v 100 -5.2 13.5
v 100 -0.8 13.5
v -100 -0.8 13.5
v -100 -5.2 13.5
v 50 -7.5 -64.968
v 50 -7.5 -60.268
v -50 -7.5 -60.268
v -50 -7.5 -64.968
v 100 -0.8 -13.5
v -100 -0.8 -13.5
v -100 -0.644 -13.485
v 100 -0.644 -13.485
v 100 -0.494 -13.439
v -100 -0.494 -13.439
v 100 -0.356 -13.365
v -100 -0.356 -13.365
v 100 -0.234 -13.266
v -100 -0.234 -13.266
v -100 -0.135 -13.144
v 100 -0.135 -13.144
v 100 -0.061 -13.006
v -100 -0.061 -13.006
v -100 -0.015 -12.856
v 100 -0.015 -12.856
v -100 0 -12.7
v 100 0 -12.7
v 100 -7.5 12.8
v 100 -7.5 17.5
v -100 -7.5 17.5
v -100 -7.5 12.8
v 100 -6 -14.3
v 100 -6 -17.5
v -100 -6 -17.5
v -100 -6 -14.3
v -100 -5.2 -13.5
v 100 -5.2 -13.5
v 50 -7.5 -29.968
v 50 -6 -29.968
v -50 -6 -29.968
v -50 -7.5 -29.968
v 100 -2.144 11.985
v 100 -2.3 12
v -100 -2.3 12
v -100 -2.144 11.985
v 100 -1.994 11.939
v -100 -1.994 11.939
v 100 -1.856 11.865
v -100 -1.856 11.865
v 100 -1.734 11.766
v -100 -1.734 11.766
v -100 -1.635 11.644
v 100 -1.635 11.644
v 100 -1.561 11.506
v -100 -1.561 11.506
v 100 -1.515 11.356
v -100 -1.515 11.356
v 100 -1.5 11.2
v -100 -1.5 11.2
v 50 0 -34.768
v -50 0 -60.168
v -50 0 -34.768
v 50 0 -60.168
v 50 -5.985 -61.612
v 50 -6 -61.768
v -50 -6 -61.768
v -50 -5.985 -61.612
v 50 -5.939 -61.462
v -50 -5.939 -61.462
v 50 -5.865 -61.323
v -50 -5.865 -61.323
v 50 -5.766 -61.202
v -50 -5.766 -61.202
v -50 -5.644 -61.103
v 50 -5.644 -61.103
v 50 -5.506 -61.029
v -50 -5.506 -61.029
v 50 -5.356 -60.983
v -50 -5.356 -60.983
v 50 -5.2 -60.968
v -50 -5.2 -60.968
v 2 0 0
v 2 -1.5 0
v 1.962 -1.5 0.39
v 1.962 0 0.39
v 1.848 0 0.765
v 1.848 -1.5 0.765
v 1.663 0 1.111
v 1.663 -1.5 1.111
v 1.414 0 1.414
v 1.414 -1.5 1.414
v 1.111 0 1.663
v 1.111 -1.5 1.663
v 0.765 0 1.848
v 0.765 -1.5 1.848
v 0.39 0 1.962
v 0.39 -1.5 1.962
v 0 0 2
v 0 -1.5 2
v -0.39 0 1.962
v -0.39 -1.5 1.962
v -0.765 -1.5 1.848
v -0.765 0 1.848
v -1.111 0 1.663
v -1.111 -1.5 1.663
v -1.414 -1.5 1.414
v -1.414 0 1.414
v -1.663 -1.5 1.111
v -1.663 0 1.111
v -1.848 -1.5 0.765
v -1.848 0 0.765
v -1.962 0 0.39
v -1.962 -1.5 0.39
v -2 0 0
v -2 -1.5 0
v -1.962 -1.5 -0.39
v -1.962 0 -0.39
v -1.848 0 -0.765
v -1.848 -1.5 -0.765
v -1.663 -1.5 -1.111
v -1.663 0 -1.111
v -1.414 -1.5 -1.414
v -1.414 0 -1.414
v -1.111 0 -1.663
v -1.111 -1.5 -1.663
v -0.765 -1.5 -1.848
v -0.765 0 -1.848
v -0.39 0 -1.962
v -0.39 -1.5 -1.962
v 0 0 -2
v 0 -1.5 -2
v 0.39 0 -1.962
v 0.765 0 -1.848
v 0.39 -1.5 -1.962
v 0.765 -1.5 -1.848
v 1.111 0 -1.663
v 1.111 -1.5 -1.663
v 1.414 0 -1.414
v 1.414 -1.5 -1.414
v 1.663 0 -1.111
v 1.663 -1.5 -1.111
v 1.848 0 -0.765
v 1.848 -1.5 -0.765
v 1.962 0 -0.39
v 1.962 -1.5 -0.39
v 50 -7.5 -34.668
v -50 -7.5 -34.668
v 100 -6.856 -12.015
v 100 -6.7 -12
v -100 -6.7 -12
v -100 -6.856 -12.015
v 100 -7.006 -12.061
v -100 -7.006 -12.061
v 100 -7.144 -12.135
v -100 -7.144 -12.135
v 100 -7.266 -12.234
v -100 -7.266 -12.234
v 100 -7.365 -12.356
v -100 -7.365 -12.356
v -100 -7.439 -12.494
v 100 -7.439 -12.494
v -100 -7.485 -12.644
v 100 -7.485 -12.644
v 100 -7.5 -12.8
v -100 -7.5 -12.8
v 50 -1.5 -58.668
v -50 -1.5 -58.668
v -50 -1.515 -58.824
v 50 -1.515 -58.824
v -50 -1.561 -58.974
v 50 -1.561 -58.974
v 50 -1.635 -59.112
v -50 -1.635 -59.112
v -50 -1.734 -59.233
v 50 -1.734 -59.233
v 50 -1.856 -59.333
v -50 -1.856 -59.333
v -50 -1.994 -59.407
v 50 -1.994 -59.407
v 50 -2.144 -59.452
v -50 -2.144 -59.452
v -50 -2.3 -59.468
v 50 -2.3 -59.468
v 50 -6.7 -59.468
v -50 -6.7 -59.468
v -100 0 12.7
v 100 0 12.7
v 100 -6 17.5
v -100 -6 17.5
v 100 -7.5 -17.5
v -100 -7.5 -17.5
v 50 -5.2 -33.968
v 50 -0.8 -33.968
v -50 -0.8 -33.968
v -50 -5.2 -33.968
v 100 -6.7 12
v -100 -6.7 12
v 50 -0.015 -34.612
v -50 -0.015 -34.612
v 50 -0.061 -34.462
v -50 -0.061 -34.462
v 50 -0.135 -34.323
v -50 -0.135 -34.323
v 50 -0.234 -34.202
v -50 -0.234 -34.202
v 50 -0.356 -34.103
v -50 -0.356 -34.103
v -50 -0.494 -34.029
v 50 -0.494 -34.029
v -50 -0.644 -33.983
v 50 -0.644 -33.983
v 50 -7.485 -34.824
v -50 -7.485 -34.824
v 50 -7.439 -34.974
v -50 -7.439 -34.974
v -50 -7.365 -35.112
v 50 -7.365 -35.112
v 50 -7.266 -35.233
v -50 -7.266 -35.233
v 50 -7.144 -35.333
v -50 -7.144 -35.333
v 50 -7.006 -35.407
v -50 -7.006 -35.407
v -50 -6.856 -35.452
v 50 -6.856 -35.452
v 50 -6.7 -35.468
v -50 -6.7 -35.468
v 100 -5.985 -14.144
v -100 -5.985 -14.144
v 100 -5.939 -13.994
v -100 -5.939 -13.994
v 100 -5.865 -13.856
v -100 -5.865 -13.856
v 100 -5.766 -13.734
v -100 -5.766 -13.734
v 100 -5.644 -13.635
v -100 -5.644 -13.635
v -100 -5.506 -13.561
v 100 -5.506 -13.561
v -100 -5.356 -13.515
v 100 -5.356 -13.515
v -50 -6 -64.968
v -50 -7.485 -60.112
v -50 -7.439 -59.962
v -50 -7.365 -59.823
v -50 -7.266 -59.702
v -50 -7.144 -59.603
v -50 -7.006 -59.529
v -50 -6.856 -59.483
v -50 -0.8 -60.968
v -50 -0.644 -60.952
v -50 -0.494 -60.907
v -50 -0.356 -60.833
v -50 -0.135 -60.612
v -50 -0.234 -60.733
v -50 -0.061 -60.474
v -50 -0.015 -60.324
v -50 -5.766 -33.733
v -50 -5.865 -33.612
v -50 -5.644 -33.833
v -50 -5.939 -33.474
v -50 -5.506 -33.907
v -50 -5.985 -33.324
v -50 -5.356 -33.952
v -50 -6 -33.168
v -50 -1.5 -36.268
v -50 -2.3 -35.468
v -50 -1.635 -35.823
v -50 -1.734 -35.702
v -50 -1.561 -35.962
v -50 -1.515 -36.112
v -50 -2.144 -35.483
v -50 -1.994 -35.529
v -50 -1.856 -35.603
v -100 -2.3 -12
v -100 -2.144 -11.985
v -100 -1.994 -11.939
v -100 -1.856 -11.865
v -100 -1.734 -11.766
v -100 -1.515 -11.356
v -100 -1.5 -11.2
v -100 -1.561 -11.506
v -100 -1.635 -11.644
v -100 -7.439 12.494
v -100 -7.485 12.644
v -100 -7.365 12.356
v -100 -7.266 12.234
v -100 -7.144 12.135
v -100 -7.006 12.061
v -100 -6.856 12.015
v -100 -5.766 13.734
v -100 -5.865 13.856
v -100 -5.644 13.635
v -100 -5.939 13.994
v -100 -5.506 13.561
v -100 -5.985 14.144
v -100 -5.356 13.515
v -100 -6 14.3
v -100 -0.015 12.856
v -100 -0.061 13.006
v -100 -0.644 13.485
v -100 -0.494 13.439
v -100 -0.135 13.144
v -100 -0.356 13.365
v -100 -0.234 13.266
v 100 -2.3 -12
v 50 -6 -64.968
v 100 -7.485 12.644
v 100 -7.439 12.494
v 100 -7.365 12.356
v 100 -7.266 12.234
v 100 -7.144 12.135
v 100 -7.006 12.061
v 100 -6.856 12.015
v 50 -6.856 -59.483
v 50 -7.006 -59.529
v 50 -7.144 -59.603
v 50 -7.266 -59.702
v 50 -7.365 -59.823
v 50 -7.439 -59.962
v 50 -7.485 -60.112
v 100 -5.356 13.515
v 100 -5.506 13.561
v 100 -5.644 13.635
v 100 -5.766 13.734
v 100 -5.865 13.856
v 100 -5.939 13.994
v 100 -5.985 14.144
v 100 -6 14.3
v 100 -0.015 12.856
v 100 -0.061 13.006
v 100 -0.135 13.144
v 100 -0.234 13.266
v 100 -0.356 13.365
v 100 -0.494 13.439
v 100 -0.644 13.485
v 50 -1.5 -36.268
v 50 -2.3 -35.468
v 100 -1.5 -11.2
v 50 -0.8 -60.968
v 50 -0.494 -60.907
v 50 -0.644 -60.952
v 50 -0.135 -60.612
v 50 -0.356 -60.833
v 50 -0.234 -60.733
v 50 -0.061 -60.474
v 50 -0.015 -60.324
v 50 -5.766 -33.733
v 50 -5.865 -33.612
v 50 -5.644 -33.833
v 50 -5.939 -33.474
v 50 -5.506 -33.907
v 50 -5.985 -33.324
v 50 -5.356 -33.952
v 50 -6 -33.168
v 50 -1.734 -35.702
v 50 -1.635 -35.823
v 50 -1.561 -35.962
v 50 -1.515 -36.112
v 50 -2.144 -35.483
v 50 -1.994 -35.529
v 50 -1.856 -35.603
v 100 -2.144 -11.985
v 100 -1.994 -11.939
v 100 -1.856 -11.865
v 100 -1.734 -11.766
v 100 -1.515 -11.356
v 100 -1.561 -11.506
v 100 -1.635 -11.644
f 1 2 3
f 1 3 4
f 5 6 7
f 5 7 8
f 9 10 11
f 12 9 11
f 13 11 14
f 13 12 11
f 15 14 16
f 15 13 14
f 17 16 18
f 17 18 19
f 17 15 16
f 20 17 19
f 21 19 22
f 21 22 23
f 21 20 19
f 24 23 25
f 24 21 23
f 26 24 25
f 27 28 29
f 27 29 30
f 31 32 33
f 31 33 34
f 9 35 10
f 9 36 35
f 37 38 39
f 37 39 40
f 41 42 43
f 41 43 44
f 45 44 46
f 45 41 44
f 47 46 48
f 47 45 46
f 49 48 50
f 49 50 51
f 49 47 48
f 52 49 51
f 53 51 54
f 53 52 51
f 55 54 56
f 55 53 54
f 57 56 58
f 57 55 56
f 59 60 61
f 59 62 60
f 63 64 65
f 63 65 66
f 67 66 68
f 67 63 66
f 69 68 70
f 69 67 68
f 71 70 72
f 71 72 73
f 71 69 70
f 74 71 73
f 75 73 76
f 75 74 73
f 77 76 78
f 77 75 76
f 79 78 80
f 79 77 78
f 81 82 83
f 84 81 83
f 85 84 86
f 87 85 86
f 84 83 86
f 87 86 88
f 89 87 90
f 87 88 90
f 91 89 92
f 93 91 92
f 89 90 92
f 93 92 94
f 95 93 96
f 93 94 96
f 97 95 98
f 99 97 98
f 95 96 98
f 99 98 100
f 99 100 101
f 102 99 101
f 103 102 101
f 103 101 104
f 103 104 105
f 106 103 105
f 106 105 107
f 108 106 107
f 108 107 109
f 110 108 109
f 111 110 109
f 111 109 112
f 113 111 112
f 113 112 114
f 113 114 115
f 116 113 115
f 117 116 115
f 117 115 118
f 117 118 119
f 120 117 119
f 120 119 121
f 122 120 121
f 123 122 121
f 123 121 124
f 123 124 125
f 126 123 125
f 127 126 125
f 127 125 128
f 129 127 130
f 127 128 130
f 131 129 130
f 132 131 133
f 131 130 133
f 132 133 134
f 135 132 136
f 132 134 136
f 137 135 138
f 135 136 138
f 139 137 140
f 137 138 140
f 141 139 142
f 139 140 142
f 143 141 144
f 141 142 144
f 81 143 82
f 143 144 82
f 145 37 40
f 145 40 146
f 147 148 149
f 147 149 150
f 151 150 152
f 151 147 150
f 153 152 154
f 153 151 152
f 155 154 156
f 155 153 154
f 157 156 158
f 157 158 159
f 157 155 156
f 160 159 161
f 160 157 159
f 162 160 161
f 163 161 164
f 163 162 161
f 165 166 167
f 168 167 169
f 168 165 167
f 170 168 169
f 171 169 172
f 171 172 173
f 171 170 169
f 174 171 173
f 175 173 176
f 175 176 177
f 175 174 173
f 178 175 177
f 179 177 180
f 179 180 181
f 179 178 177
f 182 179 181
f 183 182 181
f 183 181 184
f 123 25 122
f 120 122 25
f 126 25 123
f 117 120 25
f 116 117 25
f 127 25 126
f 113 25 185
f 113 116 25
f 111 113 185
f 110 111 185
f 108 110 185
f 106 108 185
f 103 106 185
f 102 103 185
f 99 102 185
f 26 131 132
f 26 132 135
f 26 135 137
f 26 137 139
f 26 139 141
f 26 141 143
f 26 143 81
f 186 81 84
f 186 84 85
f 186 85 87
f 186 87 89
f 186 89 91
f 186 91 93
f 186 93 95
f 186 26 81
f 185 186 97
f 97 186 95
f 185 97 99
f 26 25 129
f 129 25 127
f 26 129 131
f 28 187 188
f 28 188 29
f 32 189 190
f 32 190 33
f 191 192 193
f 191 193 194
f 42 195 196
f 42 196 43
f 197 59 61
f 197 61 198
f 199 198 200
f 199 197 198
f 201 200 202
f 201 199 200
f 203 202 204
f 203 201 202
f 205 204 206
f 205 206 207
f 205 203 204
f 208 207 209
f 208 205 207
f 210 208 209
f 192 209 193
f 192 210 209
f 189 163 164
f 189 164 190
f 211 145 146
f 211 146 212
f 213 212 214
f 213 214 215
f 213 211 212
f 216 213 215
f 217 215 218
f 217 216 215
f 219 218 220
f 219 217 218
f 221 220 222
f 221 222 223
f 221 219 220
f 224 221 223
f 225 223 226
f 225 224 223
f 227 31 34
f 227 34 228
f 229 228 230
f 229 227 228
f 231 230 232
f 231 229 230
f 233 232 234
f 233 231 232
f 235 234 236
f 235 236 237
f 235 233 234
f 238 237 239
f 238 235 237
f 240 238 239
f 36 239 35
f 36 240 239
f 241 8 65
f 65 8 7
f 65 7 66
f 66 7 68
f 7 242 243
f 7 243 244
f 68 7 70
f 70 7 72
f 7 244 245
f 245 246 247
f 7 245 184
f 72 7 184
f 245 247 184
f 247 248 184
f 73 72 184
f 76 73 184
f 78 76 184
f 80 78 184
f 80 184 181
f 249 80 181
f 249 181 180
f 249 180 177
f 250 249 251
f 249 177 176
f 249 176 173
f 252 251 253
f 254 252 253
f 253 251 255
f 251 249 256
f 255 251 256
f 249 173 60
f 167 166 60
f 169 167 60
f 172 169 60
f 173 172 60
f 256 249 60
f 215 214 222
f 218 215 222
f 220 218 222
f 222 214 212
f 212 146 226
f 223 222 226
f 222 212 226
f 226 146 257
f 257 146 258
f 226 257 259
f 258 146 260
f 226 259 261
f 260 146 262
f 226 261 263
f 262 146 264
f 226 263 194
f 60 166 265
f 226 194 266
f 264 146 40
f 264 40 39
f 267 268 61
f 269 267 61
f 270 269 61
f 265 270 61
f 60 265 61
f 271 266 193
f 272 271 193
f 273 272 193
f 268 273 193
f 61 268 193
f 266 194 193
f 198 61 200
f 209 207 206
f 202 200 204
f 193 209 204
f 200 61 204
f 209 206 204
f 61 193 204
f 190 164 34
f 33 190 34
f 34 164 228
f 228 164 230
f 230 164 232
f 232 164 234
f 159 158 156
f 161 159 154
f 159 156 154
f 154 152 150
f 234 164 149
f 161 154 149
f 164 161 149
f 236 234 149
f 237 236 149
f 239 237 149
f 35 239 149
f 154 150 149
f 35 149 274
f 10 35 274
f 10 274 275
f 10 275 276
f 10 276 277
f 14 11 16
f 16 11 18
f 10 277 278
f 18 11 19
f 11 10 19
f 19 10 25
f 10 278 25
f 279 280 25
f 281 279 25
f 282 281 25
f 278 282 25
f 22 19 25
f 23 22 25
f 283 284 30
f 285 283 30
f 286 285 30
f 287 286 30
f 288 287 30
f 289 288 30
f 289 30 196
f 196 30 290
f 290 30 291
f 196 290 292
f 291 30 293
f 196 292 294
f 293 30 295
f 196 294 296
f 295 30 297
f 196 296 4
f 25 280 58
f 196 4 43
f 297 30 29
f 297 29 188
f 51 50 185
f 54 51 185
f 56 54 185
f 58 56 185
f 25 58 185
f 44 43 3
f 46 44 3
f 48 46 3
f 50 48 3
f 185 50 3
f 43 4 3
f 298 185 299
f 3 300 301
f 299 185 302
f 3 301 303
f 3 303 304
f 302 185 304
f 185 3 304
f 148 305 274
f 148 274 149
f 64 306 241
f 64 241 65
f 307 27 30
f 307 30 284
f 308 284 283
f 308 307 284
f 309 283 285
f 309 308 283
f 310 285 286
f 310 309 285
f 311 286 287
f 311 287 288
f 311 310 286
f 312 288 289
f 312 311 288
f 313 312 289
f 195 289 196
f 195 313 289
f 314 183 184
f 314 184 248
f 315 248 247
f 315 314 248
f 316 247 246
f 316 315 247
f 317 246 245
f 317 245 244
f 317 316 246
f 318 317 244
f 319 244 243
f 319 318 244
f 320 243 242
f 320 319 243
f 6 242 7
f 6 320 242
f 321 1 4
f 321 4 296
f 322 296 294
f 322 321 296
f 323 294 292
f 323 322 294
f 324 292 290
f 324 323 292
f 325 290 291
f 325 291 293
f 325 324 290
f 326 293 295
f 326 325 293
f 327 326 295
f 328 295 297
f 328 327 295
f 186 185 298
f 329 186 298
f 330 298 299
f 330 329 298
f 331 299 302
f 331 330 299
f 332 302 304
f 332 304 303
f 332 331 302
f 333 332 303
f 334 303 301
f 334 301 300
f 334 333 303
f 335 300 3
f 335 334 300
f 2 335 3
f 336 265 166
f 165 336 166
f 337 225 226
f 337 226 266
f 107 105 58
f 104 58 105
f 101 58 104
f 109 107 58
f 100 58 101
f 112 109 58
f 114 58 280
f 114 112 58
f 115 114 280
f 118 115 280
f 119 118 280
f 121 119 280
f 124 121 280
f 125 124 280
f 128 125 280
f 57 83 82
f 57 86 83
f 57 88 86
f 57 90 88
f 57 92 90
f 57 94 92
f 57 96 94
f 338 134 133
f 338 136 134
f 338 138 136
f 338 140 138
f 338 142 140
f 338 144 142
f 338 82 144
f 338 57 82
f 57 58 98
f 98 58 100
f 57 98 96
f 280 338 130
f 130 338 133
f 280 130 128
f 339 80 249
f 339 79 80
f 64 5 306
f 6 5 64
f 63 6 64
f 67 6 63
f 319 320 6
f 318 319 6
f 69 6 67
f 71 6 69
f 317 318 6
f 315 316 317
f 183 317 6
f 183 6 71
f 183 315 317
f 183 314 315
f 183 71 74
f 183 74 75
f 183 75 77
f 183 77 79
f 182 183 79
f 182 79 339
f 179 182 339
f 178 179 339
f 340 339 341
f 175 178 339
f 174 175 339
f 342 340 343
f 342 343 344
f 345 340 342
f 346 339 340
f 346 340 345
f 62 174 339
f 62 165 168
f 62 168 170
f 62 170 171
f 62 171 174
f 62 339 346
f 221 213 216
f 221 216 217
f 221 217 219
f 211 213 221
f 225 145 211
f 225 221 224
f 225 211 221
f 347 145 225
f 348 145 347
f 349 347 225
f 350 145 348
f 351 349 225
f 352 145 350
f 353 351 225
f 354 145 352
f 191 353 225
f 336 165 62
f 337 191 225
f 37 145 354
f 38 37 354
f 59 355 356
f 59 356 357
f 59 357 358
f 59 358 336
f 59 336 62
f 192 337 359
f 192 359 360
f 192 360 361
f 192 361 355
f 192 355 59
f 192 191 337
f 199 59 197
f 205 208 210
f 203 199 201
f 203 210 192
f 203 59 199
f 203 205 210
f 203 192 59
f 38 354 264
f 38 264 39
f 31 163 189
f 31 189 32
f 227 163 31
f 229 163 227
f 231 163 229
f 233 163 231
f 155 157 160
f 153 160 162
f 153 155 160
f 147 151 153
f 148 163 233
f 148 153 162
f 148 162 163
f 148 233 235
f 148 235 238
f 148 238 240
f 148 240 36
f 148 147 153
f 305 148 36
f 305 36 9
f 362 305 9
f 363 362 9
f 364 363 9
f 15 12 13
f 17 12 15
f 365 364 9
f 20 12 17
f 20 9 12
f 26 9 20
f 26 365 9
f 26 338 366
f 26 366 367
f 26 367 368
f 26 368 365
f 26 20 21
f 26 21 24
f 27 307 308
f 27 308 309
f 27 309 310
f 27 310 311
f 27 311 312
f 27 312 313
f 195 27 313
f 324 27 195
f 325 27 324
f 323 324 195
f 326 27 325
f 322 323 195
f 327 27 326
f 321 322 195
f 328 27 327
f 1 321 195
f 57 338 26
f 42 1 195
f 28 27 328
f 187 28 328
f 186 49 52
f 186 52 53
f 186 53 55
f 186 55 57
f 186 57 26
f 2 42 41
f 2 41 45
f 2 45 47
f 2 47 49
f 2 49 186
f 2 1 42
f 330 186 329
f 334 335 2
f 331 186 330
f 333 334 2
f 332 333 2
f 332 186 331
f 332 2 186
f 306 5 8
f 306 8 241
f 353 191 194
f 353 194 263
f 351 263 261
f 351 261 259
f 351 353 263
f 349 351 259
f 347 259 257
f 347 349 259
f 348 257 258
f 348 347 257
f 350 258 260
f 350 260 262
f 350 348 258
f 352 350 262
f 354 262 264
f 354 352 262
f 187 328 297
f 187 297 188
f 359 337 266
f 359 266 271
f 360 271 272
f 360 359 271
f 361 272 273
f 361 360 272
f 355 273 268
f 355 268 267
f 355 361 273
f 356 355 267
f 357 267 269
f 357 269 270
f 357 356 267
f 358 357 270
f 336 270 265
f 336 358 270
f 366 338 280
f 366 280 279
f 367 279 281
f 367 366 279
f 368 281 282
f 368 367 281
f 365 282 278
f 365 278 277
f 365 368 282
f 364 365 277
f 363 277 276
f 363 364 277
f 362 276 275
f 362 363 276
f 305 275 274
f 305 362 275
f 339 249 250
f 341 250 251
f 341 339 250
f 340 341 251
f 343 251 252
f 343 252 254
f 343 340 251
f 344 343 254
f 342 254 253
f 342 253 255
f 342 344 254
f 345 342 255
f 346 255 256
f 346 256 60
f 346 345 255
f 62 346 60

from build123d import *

# Parameters (mm, degrees)
F1_DEPTH = 100
F2_R     = 2
F3_DEPTH = 1.501
F7_DEPTH = 50


with BuildPart() as f1:
    # F0 (on Right) → F1 (new body, symmetric)
    with BuildSketch(Plane.YZ):
        with BuildLine():
            Line((0, -12.7), (0, 0))
            Line((0, 0), (0, 12.7))
            ThreePointArc((0, 12.7), (-0.2343145751, 13.2656854249), (-0.8, 13.5))
            Line((-0.8, 13.5), (-5.2, 13.5))
            ThreePointArc((-5.2, 13.5), (-5.7656854249, 13.7343145751), (-6, 14.3))
            Line((-6, 14.3), (-6, 17.5))
            Line((-6, 17.5), (-7.5, 17.5))
            Line((-7.5, 17.5), (-7.5, 12.8))
            ThreePointArc((-7.5, 12.8), (-7.2656854249, 12.2343145751), (-6.7, 12))
            Line((-6.7, 12), (-2.3, 12))
            ThreePointArc((-2.3, 12), (-1.7343145751, 11.7656854249), (-1.5, 11.2))
            Line((-1.5, 11.2), (-1.5, 0))
            Line((-1.5, 0), (-1.5, -11.2))
            ThreePointArc((-1.5, -11.2), (-1.7343145751, -11.7656854249), (-2.3, -12))
            Line((-2.3, -12), (-6.7, -12))
            ThreePointArc((-6.7, -12), (-7.2656854249, -12.2343145751), (-7.5, -12.8))
            Line((-7.5, -12.8), (-7.5, -17.5))
            Line((-7.5, -17.5), (-6, -17.5))
            Line((-6, -17.5), (-6, -14.3))
            ThreePointArc((-6, -14.3), (-5.7656854249, -13.7343145751), (-5.2, -13.5))
            Line((-5.2, -13.5), (-0.8, -13.5))
            ThreePointArc((-0.8, -13.5), (-0.2343145751, -13.2656854249), (0, -12.7))
        make_face()
    extrude(amount=F1_DEPTH, both=True)

    # F2 (on face) → F3 (cut, through all)
    with BuildSketch(Plane.XZ.offset(1.5)):
        Circle(F2_R)
    extrude(amount=-F3_DEPTH, mode=Mode.SUBTRACT)


with BuildPart() as f4_1:
    # F4: copy of F1
    add(f1.part.moved(Location((0, 0, -65))))


with BuildPart() as f7:
    # F6 (on Right) → F7 (new body, symmetric)
    with BuildSketch(Plane.YZ):
        with BuildLine():
            Line((2.0303e-06, -60.1676993489), (2.0303e-06, -47.4676993489))
            Line((2.0303e-06, -47.4676993489), (2.0303e-06, -34.7676993489))
            ThreePointArc((2.0303e-06, -34.7676993489), (-0.2343125448, -34.202013924), (-0.7999979697, -33.9676993489))
            Line((-0.7999979697, -33.9676993489), (-5.1999979697, -33.9676993489))
            ThreePointArc((-5.1999979697, -33.9676993489), (-5.7656833947, -33.7333847739), (-5.9999979697, -33.1676993489))
            Line((-5.9999979697, -33.1676993489), (-5.9999979697, -29.9676993489))
            Line((-5.9999979697, -29.9676993489), (-7.4999979697, -29.9676993489))
            Line((-7.4999979697, -29.9676993489), (-7.4999979697, -34.6676993489))
            ThreePointArc((-7.4999979697, -34.6676993489), (-7.2656833947, -35.2333847739), (-6.6999979697, -35.4676993489))
            Line((-6.6999979697, -35.4676993489), (-2.2999979697, -35.4676993489))
            ThreePointArc((-2.2999979697, -35.4676993489), (-1.7343125448, -35.702013924), (-1.4999979697, -36.2676993489))
            Line((-1.4999979697, -36.2676993489), (-1.4999979697, -47.4676993489))
            Line((-1.4999979697, -47.4676993489), (-1.4999979697, -58.6676993489))
            ThreePointArc((-1.4999979697, -58.6676993489), (-1.7343125448, -59.2333847739), (-2.2999979697, -59.4676993489))
            Line((-2.2999979697, -59.4676993489), (-6.6999979697, -59.4676993489))
            ThreePointArc((-6.6999979697, -59.4676993489), (-7.2656833947, -59.702013924), (-7.4999979697, -60.2676993489))
            Line((-7.4999979697, -60.2676993489), (-7.4999979697, -64.9676993489))
            Line((-7.4999979697, -64.9676993489), (-5.9999979697, -64.9676993489))
            Line((-5.9999979697, -64.9676993489), (-5.9999979697, -61.7676993489))
            ThreePointArc((-5.9999979697, -61.7676993489), (-5.7656833947, -61.202013924), (-5.1999979697, -60.9676993489))
            Line((-5.1999979697, -60.9676993489), (-0.7999979697, -60.9676993489))
            ThreePointArc((-0.7999979697, -60.9676993489), (-0.2343125448, -60.7333847739), (2.0303e-06, -60.1676993489))
        make_face()
    extrude(amount=F7_DEPTH, both=True)


solid = Compound([f1.part, f7.part])
